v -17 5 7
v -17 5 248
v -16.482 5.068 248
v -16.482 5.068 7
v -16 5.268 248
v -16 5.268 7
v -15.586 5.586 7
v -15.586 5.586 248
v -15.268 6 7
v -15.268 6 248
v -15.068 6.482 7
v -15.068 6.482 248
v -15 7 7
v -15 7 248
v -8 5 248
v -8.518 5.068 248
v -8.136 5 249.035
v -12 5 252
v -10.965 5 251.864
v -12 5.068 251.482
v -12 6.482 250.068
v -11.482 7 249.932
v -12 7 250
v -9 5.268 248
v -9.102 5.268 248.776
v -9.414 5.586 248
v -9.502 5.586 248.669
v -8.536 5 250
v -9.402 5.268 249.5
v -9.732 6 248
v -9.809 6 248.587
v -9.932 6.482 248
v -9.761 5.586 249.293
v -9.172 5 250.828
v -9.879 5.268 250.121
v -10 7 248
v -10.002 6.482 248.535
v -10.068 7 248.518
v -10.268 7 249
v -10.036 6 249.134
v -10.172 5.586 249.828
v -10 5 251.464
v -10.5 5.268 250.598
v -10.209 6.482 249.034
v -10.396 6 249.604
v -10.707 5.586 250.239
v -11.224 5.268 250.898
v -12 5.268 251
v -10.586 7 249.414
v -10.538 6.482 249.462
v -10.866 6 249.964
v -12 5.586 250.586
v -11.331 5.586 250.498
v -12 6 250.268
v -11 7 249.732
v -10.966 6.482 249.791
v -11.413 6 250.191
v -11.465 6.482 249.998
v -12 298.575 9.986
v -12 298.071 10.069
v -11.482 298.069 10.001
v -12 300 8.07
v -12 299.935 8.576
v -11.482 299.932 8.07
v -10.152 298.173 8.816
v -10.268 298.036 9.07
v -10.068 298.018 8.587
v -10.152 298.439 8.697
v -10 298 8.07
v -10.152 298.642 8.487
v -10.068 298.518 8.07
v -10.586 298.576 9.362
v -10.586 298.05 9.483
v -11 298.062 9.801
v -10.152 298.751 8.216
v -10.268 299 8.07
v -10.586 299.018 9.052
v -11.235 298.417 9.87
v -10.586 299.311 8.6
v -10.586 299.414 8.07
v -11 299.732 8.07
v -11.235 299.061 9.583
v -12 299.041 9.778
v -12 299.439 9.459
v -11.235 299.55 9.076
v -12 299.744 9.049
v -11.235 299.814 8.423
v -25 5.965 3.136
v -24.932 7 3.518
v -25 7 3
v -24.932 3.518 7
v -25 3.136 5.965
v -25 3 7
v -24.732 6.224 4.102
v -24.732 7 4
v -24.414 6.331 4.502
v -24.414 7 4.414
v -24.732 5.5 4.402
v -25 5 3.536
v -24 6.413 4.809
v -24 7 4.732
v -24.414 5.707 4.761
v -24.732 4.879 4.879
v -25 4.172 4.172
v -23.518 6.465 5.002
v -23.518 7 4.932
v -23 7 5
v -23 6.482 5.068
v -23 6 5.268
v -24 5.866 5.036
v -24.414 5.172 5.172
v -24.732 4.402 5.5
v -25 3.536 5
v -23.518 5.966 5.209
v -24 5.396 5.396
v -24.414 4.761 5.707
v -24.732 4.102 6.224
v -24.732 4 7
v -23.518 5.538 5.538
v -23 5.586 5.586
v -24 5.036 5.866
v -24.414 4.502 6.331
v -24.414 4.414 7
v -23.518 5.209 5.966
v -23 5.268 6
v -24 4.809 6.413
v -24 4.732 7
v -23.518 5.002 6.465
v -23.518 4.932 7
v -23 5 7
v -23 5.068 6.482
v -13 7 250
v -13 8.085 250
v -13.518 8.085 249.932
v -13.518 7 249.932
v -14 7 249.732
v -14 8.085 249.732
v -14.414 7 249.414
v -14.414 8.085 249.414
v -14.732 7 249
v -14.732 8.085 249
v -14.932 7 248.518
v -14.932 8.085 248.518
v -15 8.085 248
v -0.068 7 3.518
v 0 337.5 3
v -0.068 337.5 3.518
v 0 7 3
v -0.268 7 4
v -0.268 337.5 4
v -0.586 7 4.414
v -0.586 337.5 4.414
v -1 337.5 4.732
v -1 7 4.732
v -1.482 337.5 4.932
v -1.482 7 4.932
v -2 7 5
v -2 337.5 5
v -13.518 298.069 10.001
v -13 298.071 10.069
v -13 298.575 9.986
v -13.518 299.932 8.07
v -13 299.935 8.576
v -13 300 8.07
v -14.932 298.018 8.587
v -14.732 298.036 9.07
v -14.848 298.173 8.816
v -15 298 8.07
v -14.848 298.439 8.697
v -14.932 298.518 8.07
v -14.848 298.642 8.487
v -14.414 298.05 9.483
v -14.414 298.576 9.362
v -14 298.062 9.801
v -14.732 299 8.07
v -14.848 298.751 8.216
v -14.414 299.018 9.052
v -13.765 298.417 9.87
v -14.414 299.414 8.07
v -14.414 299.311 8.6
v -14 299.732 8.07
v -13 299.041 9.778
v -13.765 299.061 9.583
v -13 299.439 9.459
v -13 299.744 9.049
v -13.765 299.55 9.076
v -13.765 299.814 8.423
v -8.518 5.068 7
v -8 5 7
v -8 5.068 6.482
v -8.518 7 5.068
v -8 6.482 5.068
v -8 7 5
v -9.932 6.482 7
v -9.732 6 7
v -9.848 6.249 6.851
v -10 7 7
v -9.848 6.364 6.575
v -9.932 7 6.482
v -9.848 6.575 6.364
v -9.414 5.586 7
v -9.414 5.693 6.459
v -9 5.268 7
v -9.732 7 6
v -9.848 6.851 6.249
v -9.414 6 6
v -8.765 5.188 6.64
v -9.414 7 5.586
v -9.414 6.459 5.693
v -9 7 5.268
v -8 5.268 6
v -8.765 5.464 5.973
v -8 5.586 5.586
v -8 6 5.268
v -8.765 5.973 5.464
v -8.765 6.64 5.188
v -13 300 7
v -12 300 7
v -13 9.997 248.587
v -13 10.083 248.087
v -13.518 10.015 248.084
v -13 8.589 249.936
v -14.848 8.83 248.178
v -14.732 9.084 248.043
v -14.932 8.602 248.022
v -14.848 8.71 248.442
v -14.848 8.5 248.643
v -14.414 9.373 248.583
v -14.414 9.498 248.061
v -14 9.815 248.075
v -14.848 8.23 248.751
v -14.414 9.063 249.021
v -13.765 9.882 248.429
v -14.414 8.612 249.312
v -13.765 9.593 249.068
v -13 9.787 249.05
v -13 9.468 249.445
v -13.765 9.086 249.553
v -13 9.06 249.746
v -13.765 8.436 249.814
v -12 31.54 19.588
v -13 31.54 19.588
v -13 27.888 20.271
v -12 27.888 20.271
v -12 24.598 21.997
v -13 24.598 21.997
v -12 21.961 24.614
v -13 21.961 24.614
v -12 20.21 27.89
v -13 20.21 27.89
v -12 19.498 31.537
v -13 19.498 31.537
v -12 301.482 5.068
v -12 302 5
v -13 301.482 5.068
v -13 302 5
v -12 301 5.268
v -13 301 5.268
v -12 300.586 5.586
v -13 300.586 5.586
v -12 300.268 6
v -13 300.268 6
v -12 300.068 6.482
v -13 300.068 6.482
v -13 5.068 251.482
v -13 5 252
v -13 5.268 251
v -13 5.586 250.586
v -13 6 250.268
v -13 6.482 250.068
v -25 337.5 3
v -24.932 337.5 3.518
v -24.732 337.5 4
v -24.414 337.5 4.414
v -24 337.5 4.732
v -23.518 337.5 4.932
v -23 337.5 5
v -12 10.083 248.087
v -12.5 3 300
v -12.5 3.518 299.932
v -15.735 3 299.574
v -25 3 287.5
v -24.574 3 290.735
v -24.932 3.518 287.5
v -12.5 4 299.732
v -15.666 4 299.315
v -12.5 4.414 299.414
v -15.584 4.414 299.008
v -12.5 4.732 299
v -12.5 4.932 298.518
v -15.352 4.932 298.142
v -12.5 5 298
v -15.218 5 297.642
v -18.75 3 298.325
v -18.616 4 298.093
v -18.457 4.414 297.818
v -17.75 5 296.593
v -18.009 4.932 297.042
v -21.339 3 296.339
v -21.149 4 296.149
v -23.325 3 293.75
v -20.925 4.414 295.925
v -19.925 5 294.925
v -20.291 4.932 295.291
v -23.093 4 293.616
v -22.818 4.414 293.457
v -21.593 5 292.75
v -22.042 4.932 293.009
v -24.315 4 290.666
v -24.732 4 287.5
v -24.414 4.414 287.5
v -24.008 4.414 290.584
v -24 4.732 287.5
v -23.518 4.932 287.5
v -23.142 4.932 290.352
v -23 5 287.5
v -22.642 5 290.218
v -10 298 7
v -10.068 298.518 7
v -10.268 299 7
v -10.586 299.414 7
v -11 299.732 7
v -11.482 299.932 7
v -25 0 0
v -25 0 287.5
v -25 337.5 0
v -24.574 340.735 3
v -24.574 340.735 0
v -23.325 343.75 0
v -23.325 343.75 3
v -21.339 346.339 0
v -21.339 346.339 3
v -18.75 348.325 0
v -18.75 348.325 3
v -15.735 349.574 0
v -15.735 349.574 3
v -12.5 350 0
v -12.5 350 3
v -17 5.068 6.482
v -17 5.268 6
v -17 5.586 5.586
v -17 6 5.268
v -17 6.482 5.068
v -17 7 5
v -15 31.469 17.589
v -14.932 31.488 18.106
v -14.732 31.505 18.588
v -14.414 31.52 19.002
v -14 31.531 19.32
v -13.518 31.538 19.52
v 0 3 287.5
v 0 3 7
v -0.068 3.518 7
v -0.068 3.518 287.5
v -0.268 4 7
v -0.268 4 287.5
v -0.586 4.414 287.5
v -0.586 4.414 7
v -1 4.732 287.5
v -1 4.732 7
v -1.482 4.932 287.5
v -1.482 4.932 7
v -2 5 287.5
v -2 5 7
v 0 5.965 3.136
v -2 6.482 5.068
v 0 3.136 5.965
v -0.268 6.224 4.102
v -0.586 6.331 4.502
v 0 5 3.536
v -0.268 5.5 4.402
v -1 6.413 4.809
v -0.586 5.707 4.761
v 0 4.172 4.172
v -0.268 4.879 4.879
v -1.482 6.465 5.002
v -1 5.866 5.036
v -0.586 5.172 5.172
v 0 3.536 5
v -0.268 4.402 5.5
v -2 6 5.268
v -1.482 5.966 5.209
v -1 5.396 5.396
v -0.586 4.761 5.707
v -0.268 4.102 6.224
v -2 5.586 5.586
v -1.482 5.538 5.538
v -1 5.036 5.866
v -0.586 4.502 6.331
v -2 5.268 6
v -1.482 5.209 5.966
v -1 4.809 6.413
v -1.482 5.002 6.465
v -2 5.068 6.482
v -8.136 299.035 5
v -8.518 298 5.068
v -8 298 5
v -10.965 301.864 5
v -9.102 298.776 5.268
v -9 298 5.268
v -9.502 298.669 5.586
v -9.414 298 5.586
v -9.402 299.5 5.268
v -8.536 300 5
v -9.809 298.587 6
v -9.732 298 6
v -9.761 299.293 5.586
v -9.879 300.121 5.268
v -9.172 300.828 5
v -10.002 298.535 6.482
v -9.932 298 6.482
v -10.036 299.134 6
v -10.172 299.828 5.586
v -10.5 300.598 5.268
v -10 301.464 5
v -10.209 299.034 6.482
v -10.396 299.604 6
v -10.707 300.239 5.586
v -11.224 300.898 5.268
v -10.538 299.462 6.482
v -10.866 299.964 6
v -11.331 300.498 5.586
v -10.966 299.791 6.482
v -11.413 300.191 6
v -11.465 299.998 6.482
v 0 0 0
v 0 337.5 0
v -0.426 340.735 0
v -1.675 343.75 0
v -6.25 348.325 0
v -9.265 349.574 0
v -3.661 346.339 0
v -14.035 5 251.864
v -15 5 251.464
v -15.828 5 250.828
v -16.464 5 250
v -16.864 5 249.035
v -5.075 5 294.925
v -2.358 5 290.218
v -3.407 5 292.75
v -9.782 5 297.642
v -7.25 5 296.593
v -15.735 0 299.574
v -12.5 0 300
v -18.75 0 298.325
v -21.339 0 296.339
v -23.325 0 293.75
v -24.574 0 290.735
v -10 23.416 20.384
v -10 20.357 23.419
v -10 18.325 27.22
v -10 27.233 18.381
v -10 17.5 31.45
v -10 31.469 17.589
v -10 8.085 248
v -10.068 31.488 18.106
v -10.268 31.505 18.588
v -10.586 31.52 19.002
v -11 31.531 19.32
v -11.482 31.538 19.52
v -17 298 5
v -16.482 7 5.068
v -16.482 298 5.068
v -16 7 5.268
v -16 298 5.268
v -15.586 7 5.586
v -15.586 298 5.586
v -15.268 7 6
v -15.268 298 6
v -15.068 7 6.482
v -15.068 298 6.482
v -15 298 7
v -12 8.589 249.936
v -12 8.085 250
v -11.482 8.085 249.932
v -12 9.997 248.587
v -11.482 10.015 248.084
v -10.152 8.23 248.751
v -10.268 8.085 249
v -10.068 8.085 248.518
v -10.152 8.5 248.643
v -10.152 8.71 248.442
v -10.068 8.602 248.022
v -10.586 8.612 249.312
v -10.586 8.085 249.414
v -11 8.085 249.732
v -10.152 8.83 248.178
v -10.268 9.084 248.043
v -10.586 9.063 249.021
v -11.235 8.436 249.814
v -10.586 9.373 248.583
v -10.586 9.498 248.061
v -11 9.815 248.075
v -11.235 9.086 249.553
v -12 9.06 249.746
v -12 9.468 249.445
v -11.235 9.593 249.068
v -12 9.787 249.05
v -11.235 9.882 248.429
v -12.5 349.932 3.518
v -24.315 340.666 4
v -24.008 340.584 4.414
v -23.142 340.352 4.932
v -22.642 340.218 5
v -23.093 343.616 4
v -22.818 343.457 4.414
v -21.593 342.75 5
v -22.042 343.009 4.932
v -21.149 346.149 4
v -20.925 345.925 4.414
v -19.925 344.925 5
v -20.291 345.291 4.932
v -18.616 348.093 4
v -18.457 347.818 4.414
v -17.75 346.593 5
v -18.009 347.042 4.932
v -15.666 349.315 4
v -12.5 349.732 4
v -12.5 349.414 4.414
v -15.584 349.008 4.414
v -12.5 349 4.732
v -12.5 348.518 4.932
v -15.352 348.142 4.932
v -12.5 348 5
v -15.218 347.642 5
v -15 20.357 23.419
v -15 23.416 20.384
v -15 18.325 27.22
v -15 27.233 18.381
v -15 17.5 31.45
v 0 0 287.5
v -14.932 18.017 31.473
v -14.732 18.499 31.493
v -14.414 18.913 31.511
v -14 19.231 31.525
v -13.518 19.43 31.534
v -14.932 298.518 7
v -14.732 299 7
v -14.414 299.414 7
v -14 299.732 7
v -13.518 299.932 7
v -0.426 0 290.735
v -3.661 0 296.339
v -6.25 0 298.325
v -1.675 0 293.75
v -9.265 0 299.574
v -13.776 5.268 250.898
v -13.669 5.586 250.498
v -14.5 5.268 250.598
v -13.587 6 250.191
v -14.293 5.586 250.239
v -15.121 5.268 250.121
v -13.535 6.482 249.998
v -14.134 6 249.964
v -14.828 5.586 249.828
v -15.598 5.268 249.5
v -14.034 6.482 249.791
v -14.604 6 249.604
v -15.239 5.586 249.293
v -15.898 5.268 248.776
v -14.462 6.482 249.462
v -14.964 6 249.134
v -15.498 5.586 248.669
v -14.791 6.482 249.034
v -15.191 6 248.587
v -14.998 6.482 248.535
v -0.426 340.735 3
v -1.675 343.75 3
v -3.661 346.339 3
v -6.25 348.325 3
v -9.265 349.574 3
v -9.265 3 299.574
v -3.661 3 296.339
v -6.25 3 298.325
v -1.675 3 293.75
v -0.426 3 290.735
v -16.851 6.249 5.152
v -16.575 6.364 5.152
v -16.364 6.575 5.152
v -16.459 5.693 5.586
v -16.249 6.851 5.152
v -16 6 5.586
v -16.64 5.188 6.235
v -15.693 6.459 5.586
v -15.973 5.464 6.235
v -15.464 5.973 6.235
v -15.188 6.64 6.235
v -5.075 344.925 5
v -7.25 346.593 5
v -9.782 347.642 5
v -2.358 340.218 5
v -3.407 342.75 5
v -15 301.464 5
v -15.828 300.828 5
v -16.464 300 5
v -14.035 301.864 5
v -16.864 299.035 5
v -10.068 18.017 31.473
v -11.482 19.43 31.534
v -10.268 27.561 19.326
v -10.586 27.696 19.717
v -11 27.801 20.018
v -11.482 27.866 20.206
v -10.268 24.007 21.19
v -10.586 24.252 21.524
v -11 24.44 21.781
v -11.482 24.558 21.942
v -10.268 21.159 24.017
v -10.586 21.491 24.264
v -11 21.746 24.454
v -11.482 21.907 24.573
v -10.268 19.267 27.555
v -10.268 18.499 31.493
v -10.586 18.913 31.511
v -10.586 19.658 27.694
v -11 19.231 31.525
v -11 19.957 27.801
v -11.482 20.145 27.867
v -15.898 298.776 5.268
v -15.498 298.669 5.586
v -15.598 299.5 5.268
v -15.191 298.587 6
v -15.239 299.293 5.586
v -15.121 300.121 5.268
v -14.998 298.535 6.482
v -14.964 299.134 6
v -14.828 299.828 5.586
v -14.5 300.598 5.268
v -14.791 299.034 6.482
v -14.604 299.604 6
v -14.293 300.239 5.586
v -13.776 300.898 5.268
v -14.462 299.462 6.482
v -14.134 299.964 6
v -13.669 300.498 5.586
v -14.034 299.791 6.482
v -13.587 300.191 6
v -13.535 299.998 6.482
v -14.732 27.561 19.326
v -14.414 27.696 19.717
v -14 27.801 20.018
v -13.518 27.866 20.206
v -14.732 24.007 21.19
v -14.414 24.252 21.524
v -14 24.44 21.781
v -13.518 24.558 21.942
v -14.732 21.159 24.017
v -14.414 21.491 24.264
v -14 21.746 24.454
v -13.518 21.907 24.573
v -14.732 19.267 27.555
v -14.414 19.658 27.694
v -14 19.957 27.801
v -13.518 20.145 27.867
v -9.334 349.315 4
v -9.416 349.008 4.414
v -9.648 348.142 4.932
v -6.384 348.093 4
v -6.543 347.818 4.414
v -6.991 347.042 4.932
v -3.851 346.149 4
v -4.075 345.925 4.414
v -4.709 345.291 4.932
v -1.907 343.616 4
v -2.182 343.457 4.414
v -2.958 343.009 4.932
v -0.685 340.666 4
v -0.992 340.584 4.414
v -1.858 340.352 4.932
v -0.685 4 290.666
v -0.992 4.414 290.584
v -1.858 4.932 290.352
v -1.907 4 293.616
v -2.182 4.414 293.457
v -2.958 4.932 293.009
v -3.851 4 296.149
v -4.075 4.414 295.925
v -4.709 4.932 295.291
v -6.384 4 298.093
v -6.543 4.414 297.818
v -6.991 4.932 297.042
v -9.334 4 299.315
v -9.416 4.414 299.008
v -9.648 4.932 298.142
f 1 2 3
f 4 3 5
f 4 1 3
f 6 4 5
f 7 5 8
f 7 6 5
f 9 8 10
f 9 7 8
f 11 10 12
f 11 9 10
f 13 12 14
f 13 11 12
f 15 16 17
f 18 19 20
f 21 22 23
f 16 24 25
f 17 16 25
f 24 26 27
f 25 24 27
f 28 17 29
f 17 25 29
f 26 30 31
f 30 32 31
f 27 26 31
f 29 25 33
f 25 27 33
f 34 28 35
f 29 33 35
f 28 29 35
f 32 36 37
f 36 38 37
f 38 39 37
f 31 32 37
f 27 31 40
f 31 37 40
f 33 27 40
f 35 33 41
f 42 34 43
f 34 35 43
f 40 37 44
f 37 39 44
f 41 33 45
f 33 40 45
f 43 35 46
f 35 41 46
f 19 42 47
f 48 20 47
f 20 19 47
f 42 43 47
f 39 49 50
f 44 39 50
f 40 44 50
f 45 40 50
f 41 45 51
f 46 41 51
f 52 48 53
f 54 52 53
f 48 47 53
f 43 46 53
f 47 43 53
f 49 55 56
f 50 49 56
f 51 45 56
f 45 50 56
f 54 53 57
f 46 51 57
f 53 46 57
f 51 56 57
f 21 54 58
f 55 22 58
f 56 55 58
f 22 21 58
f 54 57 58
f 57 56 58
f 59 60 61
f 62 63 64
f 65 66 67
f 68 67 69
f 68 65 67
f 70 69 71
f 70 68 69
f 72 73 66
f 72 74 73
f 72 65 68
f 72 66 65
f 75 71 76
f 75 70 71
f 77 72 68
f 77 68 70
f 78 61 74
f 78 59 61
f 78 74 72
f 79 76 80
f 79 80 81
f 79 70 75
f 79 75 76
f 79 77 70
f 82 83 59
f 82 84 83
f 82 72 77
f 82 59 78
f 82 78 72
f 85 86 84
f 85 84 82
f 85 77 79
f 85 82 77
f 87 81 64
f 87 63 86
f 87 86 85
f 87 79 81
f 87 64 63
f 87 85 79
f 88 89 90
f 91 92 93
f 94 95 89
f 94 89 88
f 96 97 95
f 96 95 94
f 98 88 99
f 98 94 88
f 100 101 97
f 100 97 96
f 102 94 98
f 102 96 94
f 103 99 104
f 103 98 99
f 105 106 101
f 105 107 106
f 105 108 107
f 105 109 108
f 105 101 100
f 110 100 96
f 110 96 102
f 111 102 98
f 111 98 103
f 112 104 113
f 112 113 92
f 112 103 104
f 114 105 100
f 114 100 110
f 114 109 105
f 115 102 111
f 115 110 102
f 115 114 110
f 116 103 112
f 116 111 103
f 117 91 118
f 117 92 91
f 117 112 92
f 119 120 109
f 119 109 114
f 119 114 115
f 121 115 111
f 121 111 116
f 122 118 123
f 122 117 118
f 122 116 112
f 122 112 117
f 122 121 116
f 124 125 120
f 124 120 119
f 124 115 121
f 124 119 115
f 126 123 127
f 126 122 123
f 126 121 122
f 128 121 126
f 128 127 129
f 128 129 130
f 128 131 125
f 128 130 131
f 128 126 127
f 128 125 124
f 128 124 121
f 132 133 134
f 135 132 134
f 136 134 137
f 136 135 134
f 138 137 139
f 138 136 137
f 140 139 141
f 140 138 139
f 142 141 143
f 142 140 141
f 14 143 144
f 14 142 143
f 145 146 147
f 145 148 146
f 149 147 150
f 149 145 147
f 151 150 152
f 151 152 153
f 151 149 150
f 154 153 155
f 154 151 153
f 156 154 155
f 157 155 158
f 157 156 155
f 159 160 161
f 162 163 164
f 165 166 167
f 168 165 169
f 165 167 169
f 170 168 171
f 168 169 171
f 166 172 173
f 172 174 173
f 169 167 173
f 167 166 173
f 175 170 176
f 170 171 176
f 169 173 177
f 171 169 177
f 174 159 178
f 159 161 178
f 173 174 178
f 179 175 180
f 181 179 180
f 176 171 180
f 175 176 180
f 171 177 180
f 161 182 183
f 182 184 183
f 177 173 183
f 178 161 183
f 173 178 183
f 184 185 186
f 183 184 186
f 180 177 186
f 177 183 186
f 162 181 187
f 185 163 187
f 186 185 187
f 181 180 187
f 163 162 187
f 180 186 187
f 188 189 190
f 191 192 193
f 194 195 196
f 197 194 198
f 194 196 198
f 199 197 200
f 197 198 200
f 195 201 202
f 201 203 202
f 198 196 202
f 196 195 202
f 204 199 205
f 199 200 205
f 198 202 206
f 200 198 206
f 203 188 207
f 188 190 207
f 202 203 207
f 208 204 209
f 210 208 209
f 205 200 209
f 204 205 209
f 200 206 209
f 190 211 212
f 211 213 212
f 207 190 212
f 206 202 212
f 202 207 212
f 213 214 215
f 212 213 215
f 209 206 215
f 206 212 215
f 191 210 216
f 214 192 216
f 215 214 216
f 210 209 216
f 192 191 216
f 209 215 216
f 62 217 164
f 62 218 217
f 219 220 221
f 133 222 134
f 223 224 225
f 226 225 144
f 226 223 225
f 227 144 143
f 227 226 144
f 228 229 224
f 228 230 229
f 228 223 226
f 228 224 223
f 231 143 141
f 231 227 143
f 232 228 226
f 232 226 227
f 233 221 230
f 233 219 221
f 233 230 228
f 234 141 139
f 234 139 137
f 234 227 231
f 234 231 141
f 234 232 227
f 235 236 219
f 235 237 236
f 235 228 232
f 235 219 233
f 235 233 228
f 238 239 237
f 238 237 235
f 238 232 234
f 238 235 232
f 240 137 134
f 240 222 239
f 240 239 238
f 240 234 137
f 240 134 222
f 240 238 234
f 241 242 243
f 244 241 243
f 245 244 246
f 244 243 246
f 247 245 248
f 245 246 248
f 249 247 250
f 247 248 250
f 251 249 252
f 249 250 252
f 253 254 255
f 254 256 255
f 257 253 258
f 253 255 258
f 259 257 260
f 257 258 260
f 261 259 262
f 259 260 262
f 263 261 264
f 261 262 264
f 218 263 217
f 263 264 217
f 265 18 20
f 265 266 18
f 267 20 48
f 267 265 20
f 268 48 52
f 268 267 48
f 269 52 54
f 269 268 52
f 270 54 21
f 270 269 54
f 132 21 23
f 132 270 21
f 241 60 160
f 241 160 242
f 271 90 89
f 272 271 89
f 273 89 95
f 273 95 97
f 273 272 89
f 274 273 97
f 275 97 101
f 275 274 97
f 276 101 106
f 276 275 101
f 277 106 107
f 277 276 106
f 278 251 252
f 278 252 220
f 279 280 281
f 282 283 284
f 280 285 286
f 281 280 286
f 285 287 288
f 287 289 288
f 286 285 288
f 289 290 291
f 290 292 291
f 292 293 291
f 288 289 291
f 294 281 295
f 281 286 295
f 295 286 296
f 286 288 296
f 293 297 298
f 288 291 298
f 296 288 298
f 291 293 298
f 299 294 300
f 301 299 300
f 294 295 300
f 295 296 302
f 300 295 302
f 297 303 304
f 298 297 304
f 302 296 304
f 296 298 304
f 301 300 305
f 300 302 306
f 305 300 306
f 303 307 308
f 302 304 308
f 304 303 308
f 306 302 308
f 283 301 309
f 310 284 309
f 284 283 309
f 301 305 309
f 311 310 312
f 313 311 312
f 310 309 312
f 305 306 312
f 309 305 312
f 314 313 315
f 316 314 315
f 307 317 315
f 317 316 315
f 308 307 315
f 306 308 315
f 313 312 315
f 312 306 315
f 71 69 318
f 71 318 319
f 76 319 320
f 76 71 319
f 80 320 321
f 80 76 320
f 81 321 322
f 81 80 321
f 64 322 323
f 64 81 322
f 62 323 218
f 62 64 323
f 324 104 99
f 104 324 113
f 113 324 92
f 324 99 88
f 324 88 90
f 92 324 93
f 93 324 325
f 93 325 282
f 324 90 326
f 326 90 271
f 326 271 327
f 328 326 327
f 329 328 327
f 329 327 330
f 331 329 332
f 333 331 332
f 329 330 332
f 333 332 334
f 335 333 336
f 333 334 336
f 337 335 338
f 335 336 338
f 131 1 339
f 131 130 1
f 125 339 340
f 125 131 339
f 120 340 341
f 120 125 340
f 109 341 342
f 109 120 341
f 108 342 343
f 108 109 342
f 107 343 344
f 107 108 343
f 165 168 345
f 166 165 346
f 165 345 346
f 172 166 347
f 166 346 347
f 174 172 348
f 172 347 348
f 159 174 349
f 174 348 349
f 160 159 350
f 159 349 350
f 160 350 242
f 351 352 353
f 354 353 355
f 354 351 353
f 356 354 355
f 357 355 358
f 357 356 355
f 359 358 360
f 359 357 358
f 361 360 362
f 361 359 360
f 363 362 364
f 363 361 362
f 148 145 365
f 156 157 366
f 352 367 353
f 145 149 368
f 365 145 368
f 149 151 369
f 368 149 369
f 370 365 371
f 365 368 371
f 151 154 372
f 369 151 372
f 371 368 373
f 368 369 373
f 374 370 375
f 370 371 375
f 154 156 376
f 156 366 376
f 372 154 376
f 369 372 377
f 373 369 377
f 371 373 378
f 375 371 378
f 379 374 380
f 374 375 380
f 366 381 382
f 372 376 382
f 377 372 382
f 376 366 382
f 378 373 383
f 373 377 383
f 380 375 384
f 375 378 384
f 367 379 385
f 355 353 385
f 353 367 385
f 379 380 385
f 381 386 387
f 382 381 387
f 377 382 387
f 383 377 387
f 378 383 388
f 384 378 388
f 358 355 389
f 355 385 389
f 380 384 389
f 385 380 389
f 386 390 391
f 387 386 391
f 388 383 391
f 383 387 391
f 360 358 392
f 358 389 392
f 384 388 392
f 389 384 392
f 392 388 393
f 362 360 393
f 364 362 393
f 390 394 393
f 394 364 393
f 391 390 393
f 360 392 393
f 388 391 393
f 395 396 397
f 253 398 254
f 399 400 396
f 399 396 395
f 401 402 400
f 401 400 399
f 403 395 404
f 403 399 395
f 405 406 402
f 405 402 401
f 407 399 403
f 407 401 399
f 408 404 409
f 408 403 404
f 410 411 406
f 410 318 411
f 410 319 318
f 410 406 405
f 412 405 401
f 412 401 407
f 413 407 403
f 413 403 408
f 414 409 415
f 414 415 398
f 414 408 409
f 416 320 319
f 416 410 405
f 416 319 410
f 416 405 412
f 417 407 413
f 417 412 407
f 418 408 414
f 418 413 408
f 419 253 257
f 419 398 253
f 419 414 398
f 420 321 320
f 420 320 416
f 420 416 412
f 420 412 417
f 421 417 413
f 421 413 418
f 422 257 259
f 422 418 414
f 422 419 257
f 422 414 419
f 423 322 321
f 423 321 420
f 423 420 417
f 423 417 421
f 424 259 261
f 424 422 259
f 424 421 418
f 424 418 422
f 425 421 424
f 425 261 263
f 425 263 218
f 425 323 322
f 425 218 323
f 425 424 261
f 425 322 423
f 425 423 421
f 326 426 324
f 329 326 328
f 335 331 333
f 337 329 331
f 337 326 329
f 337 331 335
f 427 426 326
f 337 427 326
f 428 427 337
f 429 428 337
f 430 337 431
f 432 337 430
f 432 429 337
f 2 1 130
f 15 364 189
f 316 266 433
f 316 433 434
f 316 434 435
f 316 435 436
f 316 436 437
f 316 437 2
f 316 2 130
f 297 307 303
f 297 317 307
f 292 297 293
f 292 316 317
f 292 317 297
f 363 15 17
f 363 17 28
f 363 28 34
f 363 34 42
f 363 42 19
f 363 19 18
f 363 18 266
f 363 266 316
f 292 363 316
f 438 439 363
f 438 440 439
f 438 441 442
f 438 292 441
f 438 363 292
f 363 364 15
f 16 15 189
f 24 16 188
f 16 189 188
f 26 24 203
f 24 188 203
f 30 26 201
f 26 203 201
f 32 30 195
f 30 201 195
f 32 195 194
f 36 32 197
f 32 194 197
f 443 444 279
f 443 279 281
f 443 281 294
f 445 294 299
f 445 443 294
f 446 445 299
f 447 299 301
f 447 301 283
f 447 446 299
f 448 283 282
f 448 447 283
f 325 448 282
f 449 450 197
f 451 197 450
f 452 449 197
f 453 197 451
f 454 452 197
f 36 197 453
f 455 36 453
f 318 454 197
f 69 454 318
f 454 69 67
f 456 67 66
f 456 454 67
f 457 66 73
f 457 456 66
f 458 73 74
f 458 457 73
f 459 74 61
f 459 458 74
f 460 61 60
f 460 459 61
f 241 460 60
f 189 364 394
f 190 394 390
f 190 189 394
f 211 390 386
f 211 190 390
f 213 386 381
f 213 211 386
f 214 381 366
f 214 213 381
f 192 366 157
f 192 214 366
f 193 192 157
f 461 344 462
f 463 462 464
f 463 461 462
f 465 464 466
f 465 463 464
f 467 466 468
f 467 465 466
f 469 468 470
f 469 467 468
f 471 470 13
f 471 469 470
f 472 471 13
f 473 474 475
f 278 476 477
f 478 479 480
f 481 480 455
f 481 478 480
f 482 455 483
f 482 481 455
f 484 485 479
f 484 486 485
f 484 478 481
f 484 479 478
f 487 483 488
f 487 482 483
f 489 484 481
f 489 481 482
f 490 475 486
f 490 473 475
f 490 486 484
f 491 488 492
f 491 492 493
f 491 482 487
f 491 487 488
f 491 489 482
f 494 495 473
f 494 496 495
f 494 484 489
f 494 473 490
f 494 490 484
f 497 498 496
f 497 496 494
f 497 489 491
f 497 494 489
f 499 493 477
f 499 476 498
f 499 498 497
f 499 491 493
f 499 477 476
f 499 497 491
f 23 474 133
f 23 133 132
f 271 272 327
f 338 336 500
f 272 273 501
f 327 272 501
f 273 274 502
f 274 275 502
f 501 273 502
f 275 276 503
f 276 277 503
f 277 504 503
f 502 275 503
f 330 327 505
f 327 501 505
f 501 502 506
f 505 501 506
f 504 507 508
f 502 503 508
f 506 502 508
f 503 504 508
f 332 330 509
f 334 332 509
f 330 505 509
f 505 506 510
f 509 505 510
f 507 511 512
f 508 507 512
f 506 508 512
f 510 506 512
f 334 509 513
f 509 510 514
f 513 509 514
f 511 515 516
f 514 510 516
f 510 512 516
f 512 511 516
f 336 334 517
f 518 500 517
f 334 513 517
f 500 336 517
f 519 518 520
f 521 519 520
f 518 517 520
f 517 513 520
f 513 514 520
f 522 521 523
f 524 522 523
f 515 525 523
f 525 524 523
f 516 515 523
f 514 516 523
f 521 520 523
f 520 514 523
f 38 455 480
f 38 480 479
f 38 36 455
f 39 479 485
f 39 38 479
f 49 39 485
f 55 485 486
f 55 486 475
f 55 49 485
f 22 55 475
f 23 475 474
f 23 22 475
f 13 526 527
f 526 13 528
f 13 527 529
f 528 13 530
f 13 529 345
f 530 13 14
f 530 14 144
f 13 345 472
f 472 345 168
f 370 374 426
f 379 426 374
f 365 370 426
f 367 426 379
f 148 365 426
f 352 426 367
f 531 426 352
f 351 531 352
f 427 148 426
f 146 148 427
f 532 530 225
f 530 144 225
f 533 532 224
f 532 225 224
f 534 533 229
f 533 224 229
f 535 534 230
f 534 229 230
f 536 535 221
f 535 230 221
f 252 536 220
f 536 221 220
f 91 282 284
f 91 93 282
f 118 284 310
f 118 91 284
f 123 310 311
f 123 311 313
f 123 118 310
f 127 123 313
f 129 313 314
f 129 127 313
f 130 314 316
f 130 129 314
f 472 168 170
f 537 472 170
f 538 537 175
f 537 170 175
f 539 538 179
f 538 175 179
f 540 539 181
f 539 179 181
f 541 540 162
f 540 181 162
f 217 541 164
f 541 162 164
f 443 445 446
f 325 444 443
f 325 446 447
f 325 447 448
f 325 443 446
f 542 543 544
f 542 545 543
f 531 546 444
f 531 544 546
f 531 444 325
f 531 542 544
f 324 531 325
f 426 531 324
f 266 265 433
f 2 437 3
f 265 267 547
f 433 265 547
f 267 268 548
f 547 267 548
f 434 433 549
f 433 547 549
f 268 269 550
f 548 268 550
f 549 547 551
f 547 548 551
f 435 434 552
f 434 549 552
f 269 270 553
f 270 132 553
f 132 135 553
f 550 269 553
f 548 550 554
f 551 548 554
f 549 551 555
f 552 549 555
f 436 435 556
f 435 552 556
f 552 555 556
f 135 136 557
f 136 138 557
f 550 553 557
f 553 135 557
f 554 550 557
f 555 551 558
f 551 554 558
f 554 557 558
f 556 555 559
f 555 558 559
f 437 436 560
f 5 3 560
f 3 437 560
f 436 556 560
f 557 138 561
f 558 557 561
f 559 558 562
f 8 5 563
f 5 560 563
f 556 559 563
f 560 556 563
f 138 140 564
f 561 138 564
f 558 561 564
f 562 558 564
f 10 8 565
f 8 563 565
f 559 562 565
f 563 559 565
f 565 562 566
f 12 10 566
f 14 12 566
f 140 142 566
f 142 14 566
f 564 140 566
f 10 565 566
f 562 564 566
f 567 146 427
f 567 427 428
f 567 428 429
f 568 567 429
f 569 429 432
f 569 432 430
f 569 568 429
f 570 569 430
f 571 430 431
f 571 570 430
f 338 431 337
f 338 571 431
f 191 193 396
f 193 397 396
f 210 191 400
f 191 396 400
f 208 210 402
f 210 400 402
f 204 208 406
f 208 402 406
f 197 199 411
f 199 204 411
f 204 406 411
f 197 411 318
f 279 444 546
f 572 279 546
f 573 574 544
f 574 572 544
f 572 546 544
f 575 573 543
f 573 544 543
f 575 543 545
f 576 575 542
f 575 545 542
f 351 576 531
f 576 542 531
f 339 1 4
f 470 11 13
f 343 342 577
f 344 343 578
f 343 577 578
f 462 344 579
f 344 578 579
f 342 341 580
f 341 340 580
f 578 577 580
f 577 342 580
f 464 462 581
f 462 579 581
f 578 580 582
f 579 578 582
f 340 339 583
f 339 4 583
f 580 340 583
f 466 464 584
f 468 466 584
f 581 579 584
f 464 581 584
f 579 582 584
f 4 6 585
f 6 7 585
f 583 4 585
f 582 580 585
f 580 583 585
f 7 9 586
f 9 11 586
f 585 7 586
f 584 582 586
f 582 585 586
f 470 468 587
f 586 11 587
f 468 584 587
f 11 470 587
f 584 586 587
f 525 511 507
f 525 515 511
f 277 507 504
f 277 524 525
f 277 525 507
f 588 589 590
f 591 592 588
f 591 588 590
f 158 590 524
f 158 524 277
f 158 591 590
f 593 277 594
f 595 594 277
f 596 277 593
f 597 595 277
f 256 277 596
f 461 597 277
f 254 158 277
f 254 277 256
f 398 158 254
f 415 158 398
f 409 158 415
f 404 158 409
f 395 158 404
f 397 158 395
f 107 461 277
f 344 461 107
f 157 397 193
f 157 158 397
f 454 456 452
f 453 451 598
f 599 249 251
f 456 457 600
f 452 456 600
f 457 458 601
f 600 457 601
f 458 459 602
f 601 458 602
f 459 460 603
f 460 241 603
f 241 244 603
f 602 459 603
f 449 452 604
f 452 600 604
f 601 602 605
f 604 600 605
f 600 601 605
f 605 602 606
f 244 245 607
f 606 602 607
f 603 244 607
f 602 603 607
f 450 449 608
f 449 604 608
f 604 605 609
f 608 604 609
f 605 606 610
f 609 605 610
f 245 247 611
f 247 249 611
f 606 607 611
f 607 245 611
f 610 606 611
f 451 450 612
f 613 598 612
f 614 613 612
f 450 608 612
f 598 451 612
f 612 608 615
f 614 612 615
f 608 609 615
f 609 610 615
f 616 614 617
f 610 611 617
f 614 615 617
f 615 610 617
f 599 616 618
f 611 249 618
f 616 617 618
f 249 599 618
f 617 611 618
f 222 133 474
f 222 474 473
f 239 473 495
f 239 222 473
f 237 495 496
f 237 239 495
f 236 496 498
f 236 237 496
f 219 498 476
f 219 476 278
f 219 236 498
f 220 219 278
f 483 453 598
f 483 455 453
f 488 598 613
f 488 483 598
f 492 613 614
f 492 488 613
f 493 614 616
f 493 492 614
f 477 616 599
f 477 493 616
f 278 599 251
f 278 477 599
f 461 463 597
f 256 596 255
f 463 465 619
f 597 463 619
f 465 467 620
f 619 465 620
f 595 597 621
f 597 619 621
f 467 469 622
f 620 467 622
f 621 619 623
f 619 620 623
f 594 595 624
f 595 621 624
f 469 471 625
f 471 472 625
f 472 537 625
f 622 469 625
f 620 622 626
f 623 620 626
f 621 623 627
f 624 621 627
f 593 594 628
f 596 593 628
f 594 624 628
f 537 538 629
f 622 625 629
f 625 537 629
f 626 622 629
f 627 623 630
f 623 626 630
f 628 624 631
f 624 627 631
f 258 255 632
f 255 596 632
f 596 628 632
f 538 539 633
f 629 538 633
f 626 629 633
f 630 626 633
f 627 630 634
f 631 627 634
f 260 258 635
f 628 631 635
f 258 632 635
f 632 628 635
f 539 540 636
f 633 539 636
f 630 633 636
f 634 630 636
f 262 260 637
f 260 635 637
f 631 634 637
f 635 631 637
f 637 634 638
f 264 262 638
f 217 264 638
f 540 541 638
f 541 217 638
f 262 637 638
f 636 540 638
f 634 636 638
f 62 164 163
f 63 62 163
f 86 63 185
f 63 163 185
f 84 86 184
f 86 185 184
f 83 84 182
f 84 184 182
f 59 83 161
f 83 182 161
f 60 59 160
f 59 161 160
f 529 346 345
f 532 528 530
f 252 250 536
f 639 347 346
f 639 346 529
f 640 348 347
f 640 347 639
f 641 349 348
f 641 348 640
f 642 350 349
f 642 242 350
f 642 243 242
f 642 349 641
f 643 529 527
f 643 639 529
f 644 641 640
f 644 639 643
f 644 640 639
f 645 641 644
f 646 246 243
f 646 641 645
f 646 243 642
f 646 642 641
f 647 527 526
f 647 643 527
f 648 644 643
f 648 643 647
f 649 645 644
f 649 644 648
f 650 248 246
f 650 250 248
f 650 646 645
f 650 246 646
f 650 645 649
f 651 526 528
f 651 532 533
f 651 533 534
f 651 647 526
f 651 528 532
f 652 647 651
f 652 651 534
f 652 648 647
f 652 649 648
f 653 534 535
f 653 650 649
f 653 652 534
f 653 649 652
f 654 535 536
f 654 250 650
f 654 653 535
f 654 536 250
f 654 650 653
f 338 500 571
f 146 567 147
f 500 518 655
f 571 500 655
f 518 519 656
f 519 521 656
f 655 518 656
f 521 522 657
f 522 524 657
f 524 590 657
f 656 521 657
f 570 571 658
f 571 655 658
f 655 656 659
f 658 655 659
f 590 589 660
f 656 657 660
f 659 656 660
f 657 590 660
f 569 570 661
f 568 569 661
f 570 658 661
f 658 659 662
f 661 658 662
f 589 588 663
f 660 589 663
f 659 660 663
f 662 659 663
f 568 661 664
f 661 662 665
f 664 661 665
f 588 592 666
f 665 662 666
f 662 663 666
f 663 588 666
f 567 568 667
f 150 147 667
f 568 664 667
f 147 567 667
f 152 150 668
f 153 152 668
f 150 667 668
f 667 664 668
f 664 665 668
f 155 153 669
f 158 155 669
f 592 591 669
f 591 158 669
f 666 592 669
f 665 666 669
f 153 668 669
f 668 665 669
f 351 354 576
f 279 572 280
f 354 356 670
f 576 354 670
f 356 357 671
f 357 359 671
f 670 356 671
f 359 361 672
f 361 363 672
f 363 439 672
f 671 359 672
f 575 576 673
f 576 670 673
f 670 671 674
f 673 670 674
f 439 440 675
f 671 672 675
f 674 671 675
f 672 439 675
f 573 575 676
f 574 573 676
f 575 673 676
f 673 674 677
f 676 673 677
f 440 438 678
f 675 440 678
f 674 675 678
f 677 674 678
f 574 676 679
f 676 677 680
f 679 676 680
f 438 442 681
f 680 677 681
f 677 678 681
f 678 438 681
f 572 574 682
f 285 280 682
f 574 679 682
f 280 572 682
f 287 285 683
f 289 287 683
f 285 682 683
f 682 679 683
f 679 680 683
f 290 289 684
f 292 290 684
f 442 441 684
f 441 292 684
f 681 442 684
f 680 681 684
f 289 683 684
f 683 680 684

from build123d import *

# Parameters (mm, degrees)
F1_DEPTH = 25
F4_DEPTH = 5
F5_R     = 12.49999
F6_R     = 2


# Not quite as in the source:
# - a fillet or chamfer is up to 0.001 mm smaller than in the source, because OpenCascade refuses the exact size


with BuildPart() as f1:
    # F0 (on Right) → F1 (new body)
    with BuildSketch(Plane.YZ):
        Polygon((0, 300), (0, 0), (350, 0), (350, 5), (5, 5), (5, 300), align=None)
    extrude(amount=-F1_DEPTH)

    # F3 (on offset) → F4 (join)
    with BuildSketch(Plane.YZ.offset(-10)):
        Polygon((10, 250), (5, 250), (5, 5), (300, 5), (300, 10), (20, 20), align=None)
    extrude(amount=-F4_DEPTH)

    # F5 (radius 12.5 in the source; OpenCascade refuses exactly that, so slightly less here)
    f5_edges = [f1.edges().sort_by_distance(p)[0] for p in [
        (0, 2.5, 300),
        (-25, 2.5, 300),
        (-25, 350, 2.5),
        (0, 350, 2.5),
        (-12.5, 20, 20),
    ]]
    fillet(f5_edges, radius=F5_R)

    # F6
    f6_edges = [f1.edges().sort_by_distance(p)[0] for p in [
        (0, 5, 146.250005),
        (-3.661162, 5, 296.338838),
        (-5, 5, 5),
        (-12.5, 5, 300),
        (-10, 5, 127.5),
        (-21.338838, 5, 296.338838),
        (-12.5, 5, 250),
        (-25, 5, 146.250005),
        (-15, 5, 127.5),
        (-20, 5, 5),
        (-10, 14.749198, 140.768451),
        (-12.5, 19.498396, 31.536902),
        (-12.5, 10, 250),
        (-15, 14.749198, 140.768451),
        (-15, 165.770222, 14.793921),
        (-15, 23.182084, 23.206847),
        (-15, 300, 7.5),
        (-15, 152.5, 5),
        (-15, 7.5, 250),
        (-10, 165.770222, 14.793921),
        (-10, 23.182084, 23.206847),
        (-10, 300, 7.5),
        (-10, 152.5, 5),
        (-10, 7.5, 250),
        (0, 171.250005, 5),
        (-3.661162, 346.338838, 5),
        (-12.5, 350, 5),
        (-21.338838, 346.338838, 5),
        (-12.5, 300, 5),
        (-25, 171.250005, 5),
        (-12.5, 300, 10),
    ]]
    fillet(f6_edges, radius=F6_R)


solid = f1.part
